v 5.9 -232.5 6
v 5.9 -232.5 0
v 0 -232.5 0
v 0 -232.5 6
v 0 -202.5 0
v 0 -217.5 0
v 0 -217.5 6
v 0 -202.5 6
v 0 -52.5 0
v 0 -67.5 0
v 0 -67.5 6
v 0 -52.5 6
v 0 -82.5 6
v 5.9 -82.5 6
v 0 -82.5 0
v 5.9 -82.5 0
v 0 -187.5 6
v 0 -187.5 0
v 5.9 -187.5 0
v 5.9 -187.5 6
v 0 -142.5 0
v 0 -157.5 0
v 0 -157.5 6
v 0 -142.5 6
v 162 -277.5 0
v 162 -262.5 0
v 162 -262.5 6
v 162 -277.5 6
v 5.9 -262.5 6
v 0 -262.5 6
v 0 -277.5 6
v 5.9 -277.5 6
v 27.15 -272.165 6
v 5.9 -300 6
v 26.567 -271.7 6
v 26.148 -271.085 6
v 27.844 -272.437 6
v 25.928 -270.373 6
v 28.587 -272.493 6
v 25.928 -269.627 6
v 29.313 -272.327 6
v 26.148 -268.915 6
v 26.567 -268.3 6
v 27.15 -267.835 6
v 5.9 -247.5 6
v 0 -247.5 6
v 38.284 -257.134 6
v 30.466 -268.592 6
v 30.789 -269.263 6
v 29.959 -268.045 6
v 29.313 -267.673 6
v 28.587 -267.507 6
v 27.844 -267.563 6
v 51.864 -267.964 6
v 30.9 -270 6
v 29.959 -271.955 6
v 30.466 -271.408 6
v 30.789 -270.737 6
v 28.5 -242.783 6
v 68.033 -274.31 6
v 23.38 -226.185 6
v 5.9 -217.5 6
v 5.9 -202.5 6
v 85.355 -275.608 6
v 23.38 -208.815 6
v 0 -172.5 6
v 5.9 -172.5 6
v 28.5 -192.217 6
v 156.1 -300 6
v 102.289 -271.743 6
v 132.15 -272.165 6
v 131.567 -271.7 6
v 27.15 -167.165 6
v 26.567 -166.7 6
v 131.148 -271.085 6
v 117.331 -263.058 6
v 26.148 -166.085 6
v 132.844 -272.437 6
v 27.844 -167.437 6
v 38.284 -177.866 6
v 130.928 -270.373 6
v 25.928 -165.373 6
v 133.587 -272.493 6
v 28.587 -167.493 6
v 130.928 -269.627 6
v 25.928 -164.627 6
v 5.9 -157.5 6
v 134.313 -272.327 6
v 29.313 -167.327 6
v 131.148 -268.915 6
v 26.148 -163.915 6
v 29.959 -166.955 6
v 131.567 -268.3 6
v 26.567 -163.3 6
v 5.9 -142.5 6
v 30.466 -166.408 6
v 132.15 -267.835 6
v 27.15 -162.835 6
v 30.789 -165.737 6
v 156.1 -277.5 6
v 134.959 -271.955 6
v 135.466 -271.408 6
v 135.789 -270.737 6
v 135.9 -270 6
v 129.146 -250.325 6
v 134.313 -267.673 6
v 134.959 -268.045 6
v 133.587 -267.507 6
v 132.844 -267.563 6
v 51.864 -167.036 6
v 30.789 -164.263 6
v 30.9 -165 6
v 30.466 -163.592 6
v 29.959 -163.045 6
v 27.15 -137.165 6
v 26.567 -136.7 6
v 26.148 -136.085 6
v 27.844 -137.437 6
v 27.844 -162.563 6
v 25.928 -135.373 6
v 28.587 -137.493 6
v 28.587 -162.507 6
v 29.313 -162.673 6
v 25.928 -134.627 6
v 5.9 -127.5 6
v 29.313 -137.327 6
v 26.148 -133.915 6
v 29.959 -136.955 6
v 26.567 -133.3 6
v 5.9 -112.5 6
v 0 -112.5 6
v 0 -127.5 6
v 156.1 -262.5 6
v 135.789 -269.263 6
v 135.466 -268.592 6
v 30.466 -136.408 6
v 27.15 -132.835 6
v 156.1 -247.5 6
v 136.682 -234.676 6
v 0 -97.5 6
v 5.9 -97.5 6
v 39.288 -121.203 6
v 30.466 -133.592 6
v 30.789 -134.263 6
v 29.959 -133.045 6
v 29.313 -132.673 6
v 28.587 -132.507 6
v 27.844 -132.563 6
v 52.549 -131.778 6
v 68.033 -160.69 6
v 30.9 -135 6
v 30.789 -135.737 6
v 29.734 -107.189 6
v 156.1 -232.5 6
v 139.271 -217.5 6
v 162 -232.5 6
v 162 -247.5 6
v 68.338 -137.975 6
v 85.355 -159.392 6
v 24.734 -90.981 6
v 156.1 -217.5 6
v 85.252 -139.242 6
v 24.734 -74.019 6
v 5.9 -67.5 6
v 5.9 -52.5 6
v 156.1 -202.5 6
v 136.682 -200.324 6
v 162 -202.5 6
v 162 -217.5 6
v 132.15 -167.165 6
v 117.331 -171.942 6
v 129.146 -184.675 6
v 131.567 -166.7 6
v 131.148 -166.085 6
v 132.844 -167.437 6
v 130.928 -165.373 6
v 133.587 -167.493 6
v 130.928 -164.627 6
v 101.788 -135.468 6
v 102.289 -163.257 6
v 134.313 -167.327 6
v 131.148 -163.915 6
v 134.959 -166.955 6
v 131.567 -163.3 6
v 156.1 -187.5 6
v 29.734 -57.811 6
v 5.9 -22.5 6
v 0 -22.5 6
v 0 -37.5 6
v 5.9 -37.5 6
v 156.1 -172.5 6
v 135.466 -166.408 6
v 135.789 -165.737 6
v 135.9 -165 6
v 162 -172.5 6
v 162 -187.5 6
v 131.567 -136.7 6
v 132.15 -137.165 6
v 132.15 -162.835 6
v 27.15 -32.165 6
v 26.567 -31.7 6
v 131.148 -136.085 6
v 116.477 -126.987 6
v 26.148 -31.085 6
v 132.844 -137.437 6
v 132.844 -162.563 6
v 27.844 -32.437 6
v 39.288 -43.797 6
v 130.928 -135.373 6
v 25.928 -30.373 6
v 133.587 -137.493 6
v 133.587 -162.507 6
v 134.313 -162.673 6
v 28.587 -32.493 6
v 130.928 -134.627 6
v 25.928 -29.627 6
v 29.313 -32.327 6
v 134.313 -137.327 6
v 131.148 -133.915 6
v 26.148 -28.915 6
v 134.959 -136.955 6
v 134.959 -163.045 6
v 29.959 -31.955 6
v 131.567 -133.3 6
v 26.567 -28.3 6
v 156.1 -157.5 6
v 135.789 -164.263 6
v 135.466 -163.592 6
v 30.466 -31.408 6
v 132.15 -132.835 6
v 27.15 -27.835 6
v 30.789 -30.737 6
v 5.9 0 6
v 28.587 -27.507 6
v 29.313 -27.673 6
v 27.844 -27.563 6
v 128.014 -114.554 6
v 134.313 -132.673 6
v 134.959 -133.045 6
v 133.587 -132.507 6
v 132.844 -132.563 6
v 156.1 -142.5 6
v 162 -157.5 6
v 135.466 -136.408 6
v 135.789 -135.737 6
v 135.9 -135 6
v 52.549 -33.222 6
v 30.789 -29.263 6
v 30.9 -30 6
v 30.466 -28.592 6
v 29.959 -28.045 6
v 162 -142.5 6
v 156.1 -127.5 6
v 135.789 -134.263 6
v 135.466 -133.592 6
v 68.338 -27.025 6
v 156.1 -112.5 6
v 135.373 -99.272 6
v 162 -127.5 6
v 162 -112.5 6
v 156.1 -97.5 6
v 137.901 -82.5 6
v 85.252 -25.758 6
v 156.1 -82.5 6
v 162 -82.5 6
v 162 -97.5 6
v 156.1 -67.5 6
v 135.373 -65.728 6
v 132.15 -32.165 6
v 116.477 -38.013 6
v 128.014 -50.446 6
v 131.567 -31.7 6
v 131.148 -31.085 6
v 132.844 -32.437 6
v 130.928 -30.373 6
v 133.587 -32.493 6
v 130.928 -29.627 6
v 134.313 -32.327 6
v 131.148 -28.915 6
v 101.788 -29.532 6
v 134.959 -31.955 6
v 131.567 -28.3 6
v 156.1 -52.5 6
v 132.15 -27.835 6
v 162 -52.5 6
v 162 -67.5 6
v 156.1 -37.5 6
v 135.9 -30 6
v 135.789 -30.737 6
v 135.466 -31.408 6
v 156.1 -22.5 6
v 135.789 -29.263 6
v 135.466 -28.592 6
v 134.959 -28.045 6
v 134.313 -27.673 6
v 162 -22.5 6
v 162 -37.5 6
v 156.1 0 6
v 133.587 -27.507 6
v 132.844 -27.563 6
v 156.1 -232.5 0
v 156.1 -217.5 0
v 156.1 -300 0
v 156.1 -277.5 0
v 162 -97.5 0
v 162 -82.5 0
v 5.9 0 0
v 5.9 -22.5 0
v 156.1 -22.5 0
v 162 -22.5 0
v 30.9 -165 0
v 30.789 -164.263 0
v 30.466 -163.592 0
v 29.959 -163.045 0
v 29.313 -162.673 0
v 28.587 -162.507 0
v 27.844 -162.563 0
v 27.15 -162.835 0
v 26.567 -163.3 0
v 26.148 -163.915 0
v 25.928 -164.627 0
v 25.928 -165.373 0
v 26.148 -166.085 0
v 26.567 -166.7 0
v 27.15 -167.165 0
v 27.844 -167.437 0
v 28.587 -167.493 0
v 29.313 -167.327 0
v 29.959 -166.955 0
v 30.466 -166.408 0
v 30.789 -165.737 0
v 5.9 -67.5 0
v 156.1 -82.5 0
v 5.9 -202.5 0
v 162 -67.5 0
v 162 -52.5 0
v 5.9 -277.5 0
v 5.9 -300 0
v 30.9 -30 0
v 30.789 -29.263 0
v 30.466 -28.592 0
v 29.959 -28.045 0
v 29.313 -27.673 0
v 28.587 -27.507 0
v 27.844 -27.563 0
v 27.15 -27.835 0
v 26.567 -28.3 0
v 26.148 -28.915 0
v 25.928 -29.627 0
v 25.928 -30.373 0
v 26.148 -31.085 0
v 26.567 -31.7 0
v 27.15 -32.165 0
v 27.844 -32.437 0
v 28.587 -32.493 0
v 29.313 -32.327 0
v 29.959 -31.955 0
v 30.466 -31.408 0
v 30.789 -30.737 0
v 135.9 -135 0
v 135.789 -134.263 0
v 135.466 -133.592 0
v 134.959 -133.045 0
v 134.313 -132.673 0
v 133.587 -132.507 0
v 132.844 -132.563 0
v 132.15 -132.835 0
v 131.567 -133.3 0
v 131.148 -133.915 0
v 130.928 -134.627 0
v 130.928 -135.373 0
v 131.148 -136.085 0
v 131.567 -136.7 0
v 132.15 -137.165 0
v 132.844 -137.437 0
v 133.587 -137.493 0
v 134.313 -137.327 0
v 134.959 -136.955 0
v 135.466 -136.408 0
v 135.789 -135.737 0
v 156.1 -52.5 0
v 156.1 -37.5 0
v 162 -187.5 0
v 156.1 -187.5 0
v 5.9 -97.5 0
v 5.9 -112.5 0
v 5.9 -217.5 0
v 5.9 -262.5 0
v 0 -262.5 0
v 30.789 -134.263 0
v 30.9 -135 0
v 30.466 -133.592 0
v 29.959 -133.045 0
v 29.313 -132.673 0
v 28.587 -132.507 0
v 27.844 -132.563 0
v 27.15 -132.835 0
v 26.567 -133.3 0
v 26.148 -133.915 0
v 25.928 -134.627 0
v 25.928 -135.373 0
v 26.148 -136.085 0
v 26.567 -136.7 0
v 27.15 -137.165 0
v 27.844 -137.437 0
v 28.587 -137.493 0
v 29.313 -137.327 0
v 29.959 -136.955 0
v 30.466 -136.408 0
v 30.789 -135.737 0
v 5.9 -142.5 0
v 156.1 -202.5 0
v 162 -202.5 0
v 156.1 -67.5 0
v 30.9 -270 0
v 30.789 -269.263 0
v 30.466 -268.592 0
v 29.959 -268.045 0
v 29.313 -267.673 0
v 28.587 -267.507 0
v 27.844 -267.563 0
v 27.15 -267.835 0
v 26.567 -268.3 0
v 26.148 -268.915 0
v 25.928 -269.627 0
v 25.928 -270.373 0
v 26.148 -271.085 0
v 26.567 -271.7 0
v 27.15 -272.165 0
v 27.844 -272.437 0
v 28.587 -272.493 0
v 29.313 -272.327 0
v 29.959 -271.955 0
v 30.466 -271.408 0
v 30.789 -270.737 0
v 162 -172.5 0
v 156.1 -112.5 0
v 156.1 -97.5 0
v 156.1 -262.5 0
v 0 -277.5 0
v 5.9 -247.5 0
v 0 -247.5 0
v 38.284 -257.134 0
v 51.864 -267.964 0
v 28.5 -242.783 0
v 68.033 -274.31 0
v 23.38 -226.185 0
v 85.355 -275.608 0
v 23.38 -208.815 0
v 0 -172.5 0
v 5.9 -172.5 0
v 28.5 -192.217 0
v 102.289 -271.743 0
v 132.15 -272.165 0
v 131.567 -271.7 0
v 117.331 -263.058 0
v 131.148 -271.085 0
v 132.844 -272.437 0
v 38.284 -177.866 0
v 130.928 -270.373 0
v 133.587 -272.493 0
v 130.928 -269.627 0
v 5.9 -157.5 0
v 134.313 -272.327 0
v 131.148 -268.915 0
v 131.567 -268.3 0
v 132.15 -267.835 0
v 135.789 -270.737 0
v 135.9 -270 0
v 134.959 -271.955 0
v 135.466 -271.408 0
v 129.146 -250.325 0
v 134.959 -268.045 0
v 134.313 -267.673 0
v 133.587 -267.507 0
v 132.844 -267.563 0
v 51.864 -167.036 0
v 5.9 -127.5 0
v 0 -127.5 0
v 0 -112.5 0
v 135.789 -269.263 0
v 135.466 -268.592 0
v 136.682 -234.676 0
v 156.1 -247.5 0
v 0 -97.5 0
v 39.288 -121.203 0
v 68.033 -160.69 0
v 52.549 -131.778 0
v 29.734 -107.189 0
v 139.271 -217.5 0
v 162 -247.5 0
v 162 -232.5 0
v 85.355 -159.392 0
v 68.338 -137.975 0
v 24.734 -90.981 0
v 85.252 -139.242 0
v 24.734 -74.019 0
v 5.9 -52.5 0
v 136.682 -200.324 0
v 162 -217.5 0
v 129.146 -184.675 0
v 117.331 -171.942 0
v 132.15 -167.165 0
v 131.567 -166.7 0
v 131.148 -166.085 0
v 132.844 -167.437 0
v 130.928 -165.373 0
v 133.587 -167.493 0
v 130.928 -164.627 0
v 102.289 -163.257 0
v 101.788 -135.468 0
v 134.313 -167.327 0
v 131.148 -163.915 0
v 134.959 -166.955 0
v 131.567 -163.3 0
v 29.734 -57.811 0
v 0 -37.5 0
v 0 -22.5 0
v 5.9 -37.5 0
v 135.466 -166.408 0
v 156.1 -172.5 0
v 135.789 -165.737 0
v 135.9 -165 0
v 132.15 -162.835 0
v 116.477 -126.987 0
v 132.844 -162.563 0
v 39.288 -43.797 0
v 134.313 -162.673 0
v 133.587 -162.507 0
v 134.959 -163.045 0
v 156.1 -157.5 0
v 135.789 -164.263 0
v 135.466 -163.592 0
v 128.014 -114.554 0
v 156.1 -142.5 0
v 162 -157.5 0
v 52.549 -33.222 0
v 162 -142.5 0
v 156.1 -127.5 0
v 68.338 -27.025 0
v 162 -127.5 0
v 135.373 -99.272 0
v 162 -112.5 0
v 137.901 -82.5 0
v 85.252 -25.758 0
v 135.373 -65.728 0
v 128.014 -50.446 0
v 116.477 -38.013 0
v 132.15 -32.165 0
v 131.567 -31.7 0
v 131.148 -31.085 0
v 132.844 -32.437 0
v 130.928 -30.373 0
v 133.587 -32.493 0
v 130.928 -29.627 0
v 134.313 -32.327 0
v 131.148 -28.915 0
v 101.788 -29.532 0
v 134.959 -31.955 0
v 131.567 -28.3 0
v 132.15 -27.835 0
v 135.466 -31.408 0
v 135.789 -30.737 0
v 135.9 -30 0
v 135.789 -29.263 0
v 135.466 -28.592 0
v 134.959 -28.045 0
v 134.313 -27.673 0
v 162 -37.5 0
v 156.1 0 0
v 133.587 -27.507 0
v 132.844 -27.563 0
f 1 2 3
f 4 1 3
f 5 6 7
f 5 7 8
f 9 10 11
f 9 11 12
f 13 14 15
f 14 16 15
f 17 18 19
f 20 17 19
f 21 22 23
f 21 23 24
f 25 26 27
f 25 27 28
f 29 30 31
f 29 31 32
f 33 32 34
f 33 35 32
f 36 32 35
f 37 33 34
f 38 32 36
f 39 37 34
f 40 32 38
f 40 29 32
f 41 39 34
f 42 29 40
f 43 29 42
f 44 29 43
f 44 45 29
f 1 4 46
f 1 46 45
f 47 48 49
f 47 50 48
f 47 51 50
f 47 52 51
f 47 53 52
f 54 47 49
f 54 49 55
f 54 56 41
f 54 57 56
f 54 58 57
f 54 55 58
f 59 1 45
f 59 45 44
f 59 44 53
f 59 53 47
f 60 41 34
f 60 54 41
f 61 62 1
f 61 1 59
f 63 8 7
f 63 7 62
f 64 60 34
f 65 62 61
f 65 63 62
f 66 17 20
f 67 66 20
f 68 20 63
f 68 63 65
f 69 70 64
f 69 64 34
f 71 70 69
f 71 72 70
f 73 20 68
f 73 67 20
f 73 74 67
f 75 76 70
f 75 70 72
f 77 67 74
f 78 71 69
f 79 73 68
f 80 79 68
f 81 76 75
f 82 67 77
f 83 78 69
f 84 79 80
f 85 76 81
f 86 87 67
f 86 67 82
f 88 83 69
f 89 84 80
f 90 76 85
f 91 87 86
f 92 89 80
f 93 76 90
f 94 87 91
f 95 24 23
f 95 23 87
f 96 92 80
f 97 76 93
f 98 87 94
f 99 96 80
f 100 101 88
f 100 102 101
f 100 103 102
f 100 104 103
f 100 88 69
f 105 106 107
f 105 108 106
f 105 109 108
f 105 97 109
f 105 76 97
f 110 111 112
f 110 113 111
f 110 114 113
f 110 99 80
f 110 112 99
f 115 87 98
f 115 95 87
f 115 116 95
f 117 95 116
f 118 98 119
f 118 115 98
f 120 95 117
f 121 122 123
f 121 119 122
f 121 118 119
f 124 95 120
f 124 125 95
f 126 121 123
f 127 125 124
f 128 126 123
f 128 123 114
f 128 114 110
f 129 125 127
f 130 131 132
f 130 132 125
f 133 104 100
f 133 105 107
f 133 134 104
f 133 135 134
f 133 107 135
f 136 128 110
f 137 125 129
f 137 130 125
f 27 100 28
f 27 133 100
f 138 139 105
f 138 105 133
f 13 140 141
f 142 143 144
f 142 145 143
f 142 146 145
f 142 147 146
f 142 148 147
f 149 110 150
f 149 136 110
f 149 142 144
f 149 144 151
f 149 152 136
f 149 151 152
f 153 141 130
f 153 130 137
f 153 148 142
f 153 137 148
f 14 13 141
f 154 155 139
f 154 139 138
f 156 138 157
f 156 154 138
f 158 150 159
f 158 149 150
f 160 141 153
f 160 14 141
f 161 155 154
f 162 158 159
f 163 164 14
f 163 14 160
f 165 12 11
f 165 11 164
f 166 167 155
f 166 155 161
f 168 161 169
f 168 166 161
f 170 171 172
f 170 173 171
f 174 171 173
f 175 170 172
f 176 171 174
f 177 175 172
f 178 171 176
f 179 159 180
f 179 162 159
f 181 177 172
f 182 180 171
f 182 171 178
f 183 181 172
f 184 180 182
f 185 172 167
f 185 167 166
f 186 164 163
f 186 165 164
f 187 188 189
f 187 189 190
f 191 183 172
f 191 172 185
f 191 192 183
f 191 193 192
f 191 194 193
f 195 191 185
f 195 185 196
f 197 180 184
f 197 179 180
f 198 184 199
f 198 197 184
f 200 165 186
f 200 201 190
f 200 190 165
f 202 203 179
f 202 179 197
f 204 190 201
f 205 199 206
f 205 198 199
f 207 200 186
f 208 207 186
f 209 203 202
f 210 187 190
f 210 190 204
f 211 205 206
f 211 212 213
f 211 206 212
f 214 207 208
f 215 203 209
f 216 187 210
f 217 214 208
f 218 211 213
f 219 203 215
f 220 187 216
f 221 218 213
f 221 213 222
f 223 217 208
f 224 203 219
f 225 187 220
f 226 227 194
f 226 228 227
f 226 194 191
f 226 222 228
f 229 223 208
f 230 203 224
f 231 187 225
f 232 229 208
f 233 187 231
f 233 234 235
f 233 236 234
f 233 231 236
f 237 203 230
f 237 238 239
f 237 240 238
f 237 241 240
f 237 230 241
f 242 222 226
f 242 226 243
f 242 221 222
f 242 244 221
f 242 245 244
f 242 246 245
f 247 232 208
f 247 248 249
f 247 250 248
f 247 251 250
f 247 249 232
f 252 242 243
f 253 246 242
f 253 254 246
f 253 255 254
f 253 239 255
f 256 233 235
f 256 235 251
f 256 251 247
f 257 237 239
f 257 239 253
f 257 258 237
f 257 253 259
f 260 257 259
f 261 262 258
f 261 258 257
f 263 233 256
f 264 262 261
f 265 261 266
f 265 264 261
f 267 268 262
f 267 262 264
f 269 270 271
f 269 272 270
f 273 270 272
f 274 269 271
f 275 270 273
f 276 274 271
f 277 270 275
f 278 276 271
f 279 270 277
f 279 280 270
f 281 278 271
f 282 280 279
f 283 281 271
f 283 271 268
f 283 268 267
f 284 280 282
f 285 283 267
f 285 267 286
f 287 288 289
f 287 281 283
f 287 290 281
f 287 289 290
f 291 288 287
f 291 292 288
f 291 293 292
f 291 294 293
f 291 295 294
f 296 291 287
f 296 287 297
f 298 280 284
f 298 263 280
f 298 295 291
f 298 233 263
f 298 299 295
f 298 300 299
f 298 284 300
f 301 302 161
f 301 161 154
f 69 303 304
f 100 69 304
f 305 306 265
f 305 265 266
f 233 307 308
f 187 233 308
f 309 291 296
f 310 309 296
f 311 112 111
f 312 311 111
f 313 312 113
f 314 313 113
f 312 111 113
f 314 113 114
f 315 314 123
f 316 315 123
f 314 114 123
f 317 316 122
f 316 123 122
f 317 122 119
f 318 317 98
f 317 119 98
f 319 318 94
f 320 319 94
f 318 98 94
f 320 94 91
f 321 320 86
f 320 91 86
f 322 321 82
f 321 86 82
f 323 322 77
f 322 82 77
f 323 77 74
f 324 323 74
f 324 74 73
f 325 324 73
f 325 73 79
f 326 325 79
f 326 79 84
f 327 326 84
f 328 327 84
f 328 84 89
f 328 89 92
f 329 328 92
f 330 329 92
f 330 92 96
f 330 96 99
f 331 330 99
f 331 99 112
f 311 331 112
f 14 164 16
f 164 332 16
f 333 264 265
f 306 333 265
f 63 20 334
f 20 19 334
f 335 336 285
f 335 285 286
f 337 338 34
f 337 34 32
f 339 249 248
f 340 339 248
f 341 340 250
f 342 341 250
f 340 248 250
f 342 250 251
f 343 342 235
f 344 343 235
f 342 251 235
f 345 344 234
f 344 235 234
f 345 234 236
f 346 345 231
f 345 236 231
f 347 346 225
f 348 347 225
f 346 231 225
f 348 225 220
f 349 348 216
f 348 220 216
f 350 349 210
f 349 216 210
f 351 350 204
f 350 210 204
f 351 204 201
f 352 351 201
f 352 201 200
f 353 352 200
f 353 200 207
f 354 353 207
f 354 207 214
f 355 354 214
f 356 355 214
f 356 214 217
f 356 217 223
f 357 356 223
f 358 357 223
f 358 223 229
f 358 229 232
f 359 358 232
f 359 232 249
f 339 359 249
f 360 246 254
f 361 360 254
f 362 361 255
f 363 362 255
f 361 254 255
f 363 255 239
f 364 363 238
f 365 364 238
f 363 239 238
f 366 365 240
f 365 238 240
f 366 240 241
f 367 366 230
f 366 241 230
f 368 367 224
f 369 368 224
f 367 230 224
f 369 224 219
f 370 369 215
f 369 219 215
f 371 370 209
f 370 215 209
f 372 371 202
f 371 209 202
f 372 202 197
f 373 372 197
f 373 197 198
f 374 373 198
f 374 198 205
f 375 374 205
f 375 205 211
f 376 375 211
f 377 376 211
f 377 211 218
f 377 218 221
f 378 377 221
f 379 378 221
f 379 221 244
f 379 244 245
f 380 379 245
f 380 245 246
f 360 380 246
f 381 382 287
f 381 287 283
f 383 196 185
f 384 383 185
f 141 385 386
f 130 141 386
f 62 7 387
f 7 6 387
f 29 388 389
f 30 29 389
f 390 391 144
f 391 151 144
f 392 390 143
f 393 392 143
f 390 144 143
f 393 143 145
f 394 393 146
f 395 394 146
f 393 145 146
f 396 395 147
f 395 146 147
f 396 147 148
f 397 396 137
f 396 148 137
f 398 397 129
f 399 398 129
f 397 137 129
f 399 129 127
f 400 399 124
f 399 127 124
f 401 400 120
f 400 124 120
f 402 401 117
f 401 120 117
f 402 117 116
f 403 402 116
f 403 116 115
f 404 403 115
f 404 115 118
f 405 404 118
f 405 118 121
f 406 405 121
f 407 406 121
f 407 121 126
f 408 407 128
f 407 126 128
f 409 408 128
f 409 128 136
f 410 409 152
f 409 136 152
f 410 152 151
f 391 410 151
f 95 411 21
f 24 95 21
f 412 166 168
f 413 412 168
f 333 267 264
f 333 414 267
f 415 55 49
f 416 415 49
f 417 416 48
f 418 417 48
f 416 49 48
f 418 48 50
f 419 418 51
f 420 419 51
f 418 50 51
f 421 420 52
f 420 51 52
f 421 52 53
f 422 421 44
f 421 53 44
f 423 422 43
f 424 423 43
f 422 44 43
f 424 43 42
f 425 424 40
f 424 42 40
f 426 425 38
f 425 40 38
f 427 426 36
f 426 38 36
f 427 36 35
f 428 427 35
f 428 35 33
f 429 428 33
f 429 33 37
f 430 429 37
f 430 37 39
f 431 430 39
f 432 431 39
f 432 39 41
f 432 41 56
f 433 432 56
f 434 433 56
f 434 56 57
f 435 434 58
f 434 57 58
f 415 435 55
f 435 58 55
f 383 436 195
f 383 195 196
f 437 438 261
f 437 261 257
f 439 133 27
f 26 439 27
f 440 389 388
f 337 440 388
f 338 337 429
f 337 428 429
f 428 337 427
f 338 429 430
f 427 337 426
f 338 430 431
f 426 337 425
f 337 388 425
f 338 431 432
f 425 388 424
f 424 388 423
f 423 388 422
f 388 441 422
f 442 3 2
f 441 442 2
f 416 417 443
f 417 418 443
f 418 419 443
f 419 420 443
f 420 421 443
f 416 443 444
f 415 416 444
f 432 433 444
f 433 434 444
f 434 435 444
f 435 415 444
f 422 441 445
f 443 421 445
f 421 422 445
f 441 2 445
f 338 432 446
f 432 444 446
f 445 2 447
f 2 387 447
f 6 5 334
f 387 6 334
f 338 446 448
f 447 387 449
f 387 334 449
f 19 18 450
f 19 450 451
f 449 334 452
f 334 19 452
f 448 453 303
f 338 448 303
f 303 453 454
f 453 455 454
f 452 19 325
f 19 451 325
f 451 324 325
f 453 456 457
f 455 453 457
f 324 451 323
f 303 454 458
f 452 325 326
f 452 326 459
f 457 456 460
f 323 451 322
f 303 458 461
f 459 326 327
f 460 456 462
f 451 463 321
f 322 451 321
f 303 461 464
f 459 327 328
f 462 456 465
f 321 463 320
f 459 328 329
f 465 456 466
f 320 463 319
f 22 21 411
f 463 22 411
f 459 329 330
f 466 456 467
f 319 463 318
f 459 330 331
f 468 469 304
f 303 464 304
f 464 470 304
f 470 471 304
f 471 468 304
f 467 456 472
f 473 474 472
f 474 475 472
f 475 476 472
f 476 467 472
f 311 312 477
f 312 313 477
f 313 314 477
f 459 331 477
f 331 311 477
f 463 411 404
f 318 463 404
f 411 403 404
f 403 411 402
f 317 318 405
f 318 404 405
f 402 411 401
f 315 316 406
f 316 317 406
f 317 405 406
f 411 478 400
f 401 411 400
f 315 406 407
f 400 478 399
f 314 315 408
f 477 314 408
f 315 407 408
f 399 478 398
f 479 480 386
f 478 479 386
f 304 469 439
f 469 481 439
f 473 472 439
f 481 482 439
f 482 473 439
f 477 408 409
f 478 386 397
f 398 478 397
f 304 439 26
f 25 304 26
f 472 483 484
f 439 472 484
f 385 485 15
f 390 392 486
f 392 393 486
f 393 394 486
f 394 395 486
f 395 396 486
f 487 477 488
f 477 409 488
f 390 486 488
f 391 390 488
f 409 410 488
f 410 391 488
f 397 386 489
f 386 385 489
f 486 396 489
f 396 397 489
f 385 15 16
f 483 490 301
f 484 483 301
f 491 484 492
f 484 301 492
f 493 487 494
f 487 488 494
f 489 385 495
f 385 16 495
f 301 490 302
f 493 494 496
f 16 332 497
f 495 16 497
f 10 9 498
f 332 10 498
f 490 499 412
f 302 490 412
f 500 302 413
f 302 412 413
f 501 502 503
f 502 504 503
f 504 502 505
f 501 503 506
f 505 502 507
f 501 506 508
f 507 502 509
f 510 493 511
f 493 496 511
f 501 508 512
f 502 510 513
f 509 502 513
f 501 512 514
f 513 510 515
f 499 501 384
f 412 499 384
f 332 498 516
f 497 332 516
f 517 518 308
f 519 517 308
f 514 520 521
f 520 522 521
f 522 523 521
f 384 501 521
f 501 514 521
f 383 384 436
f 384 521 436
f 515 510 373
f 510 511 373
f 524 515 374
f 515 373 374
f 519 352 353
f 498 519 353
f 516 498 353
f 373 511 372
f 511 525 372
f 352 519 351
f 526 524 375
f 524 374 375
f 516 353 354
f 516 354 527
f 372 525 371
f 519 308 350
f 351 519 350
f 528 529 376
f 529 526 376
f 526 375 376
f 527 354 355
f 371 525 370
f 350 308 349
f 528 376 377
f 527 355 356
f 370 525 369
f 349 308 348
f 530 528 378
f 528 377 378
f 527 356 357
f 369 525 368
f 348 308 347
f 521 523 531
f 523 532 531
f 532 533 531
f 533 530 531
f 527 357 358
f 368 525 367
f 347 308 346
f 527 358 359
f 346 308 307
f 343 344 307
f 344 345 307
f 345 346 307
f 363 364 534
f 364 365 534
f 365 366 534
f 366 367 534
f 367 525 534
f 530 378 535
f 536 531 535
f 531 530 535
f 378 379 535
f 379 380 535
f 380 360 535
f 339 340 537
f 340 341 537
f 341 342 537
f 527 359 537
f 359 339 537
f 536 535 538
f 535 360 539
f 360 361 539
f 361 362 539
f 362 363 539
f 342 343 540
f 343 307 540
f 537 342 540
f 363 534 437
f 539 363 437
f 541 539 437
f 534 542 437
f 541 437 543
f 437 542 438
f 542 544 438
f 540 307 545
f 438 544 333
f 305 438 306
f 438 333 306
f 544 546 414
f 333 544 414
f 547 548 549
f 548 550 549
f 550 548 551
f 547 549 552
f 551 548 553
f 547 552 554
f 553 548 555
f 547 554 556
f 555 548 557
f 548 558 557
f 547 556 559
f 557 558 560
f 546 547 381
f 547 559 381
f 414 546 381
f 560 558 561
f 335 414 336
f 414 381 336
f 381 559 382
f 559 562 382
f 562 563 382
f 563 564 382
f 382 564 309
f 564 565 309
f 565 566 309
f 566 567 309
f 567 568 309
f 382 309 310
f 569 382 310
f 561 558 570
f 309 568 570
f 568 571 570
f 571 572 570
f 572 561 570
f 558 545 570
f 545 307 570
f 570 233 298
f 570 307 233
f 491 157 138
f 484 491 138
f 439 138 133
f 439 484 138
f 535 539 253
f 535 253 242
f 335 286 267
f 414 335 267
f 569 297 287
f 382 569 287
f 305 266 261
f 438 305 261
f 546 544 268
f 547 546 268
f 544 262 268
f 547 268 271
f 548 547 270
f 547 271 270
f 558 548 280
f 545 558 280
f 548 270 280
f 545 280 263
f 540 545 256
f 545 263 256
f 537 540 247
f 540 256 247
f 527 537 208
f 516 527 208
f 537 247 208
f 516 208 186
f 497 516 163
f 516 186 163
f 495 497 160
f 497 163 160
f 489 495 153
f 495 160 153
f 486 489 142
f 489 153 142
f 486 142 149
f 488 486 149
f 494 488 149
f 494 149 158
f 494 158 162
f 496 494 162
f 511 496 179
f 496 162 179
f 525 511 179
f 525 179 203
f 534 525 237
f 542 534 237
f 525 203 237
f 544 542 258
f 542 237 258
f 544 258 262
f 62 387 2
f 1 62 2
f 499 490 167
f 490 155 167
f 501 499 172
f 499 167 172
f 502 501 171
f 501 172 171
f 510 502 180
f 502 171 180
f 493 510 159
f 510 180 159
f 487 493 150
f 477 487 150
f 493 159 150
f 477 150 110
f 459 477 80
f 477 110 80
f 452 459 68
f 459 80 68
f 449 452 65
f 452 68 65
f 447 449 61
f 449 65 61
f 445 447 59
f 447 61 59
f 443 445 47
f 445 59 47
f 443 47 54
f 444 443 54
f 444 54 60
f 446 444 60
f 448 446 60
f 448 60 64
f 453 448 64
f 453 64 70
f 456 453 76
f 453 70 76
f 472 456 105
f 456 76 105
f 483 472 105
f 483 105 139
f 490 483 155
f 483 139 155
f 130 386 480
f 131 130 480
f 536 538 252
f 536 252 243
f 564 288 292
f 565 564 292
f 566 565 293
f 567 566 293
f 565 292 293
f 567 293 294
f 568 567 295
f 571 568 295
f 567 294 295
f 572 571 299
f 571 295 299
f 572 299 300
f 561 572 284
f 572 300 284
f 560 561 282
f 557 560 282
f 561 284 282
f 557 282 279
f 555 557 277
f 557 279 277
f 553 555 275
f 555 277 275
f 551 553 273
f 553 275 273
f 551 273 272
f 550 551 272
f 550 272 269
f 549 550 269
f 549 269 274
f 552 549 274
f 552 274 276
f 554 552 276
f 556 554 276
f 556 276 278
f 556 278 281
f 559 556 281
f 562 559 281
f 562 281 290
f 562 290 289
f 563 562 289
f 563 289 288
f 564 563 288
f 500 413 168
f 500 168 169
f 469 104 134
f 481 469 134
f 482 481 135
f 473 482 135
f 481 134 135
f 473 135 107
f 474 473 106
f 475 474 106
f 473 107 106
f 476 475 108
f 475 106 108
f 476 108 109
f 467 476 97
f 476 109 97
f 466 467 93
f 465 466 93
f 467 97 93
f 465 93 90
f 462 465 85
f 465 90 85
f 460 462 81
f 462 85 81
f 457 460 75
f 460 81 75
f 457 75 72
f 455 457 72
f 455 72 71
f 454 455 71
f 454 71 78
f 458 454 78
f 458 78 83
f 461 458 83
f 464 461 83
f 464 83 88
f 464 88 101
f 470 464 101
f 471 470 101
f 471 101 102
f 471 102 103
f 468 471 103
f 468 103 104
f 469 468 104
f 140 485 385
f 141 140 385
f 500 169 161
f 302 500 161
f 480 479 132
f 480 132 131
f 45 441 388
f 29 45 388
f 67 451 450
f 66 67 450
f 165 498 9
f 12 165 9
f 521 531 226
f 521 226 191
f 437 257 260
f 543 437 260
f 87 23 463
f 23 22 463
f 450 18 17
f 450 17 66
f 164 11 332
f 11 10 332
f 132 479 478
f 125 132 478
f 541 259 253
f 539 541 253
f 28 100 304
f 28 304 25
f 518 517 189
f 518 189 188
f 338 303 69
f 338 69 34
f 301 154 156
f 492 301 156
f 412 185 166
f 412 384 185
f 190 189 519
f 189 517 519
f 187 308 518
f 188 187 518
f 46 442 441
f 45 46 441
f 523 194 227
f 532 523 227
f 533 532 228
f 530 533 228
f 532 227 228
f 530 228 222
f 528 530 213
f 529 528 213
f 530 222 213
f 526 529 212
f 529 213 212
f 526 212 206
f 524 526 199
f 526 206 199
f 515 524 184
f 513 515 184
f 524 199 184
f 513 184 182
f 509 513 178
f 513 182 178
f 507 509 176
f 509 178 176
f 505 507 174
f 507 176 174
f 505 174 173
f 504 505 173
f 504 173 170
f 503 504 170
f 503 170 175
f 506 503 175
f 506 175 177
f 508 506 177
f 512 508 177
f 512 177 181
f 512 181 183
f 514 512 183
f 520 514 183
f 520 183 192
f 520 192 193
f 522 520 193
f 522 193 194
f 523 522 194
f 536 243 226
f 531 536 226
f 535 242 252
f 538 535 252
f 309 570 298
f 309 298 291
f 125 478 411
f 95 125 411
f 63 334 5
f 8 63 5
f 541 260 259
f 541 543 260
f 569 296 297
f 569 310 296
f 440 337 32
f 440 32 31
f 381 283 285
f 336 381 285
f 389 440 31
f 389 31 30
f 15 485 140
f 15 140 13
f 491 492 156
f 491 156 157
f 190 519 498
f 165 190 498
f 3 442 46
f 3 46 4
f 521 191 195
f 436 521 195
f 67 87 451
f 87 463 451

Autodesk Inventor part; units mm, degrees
ref_plane "YZ Plane" through (0, 0, 0) normal (1, 0, 0) x (0, 1, 0)
ref_plane "XZ Plane" through (0, 0, 0) normal (0, 1, 0) x (-1, 0, 0)
ref_plane "XY Plane" through (0, 0, 0) normal (0, 0, 1) x (1, 0, 0)
sketch "Sketch1" plane through (0, 0, 0) normal (0, 0, 1) x (1, 0, 0)
  line L0 (0, 0) -> (162, 0)
  line L1 (162, 0) -> (162, -300)
  line L2 (162, -300) -> (0, -300)
  line L3 (0, -300) -> (0, 0)
  dimension "d0" = 162
  dimension "d1" = 300
extrude "Extrusion1" add sketch "Sketch1" along normal blind 6
sketch "Sketch2" plane through (0, 0, 0) normal (0, 0, -1) x (-1, 0, 0)
  line L0 (0, 0) -> (-5.9, 0)
  line L1 (-5.9, 0) -> (-5.9, -22.5)
  line L2 (-5.9, -22.5) -> (0, -22.5)
  line L3 (0, -22.5) -> (0, 0)
  line L4 (-162, 0) -> (0, 0) projected
  line L5 (0, 0) -> (0, -300) projected
  line L6 (0, -37.5) -> (-5.9, -37.5)
  line L7 (-5.9, -37.5) -> (-5.9, -52.5)
  line L8 (-5.9, -52.5) -> (0, -52.5)
  line L9 (0, -52.5) -> (0, -37.5)
  line L10 (0, -30) -> (-5.9, -30)
  line L11 (0, -67.5) -> (-5.9, -67.5)
  line L12 (-5.9, -67.5) -> (-5.9, -82.5)
  line L13 (-5.9, -82.5) -> (0, -82.5)
  line L14 (0, -82.5) -> (0, -67.5)
  line L15 (0, -60) -> (-5.9, -60)
  line L16 (0, -97.5) -> (-5.9, -97.5)
  line L17 (-5.9, -97.5) -> (-5.9, -112.5)
  line L18 (-5.9, -112.5) -> (0, -112.5)
  line L19 (0, -112.5) -> (0, -97.5)
  line L20 (0, -90) -> (-5.9, -90)
  line L21 (0, -127.5) -> (-5.9, -127.5)
  line L22 (-5.9, -127.5) -> (-5.9, -142.5)
  line L23 (-5.9, -142.5) -> (0, -142.5)
  line L24 (0, -142.5) -> (0, -127.5)
  line L25 (0, -120) -> (-5.9, -120)
  line L26 (0, -157.5) -> (-5.9, -157.5)
  line L27 (-5.9, -157.5) -> (-5.9, -172.5)
  line L28 (-5.9, -172.5) -> (0, -172.5)
  line L29 (0, -172.5) -> (0, -157.5)
  line L30 (0, -150) -> (-5.9, -150)
  line L31 (0, -187.5) -> (-5.9, -187.5)
  line L32 (-5.9, -187.5) -> (-5.9, -202.5)
  line L33 (-5.9, -202.5) -> (0, -202.5)
  line L34 (0, -202.5) -> (0, -187.5)
  line L35 (0, -180) -> (-5.9, -180)
  line L36 (0, -217.5) -> (-5.9, -217.5)
  line L37 (-5.9, -217.5) -> (-5.9, -232.5)
  line L38 (-5.9, -232.5) -> (0, -232.5)
  line L39 (0, -232.5) -> (0, -217.5)
  line L40 (0, -210) -> (-5.9, -210)
  line L41 (0, -247.5) -> (-5.9, -247.5)
  line L42 (-5.9, -247.5) -> (-5.9, -262.5)
  line L43 (-5.9, -262.5) -> (0, -262.5)
  line L44 (0, -262.5) -> (0, -247.5)
  line L45 (0, -300) -> (-5.9, -300)
  line L46 (-5.9, -300) -> (-5.9, -277.5)
  line L47 (-5.9, -277.5) -> (0, -277.5)
  line L48 (0, -277.5) -> (0, -300)
  line L49 (-162, 0) -> (0, 0) projected
  line L50 (-81, 0) -> (-81, -60)
  line L51 (-162, 0) -> (-156.1, 0)
  line L52 (-156.1, 0) -> (-156.1, -22.5)
  line L53 (-156.1, -22.5) -> (-162, -22.5)
  line L54 (-162, -22.5) -> (-162, 0)
  line L55 (0, 0) -> (-162, 0)
  line L56 (-162, 0) -> (-162, -300)
  line L57 (-162, -37.5) -> (-156.1, -37.5)
  line L58 (-156.1, -37.5) -> (-156.1, -52.5)
  line L59 (-156.1, -52.5) -> (-162, -52.5)
  line L60 (-162, -52.5) -> (-162, -37.5)
  line L61 (-162, -30) -> (-156.1, -30)
  line L62 (-162, -67.5) -> (-156.1, -67.5)
  line L63 (-156.1, -67.5) -> (-156.1, -82.5)
  line L64 (-156.1, -82.5) -> (-162, -82.5)
  line L65 (-162, -82.5) -> (-162, -67.5)
  line L66 (-162, -60) -> (-156.1, -60)
  line L67 (-162, -97.5) -> (-156.1, -97.5)
  line L68 (-156.1, -97.5) -> (-156.1, -112.5)
  line L69 (-156.1, -112.5) -> (-162, -112.5)
  line L70 (-162, -112.5) -> (-162, -97.5)
  line L71 (-162, -90) -> (-156.1, -90)
  line L72 (-162, -127.5) -> (-156.1, -127.5)
  line L73 (-156.1, -127.5) -> (-156.1, -142.5)
  line L74 (-156.1, -142.5) -> (-162, -142.5)
  line L75 (-162, -142.5) -> (-162, -127.5)
  line L76 (-162, -120) -> (-156.1, -120)
  line L77 (-162, -157.5) -> (-156.1, -157.5)
  line L78 (-156.1, -157.5) -> (-156.1, -172.5)
  line L79 (-156.1, -172.5) -> (-162, -172.5)
  line L80 (-162, -172.5) -> (-162, -157.5)
  line L81 (-162, -150) -> (-156.1, -150)
  line L82 (-162, -187.5) -> (-156.1, -187.5)
  line L83 (-156.1, -187.5) -> (-156.1, -202.5)
  line L84 (-156.1, -202.5) -> (-162, -202.5)
  line L85 (-162, -202.5) -> (-162, -187.5)
  line L86 (-162, -180) -> (-156.1, -180)
  line L87 (-162, -217.5) -> (-156.1, -217.5)
  line L88 (-156.1, -217.5) -> (-156.1, -232.5)
  line L89 (-156.1, -232.5) -> (-162, -232.5)
  line L90 (-162, -232.5) -> (-162, -217.5)
  line L91 (-162, -210) -> (-156.1, -210)
  line L92 (-162, -247.5) -> (-156.1, -247.5)
  line L93 (-156.1, -247.5) -> (-156.1, -262.5)
  line L94 (-156.1, -262.5) -> (-162, -262.5)
  line L95 (-162, -262.5) -> (-162, -247.5)
  line L96 (-162, -300) -> (-156.1, -300)
  line L97 (-156.1, -300) -> (-156.1, -277.5)
  line L98 (-156.1, -277.5) -> (-162, -277.5)
  line L99 (-162, -277.5) -> (-162, -300)
  line L100 (0, 0) -> (-162, 0)
  point P0 (-162, -277.5)
  point P1 (0, -277.5)
  point P2 (0, -262.5)
  point P3 (0, -232.5)
  point P4 (0, -202.5)
  point P5 (-162, -82.5)
  point P6 (0, -172.5)
  point P7 (-162, -157.5)
  point P8 (0, -142.5)
  point P9 (-162, -142.5)
  point P10 (0, -112.5)
  point P11 (-162, -97.5)
  point P12 (0, -82.5)
  point P13 (-162, -247.5)
  point P14 (-156.1, 0)
  point P15 (-162, -232.5)
  dimension "d4" = 0
  dimension "d5" = 5.9
  dimension "d6" = 0
  dimension "d7" = 22.5
  dimension "d8" = 5.9
  dimension "d9" = 15
  dimension "d10" = 15
  dimension "d13" = 30
  dimension "d18" = 22.5
  dimension "d19" = 5.9
extrude "Extrusion2" cut sketch "Sketch2" against normal mid plane 24
sketch "Sketch3" plane through (0, 0, 6) normal (0, 0, 1) x (1, 0, 0)
  circle A0 centre (28.4, -30) radius 2.5
  circle A1 centre (133.4, -30) radius 2.5
  circle A2 centre (28.4, -135) radius 2.5
  circle A3 centre (133.4, -135) radius 2.5
  circle A4 centre (28.4, -165) radius 2.5
  circle A5 centre (133.4, -165) radius 2.5
  circle A6 centre (28.4, -270) radius 2.5
  circle A7 centre (133.4, -270) radius 2.5
  line L0 (5.9, 0) -> (5.9, -22.5) projected
  line L1 (156.1, -22.5) -> (156.1, 0) projected
  line L2 (5.9, -300) -> (156.1, -300) projected
  line L3 (156.1, 0) -> (5.9, 0) projected
  circle A8 centre (81, -82.5) radius 56.9012
  circle A9 centre (81, -217.5) radius 58.271
  line L4 (156.1, -202.5) -> (156.1, -187.5) projected
  point P0 (0, 0)
  dimension "d22" = 5
  dimension "d23" = 5
  dimension "d24" = 5
  dimension "d25" = 5
  dimension "d26" = 5
  dimension "d27" = 5
  dimension "d28" = 5
  dimension "d29" = 5
  dimension "d30" = 105
  dimension "d31" = 105
  dimension "d32" = 105
  dimension "d33" = 22.5
  dimension "d34" = 150.2
  dimension "d35" = 105
  dimension "d36" = 105
  dimension "d37" = 105
  dimension "d38" = 30
  dimension "d39" = 22.5
  dimension "d40" = 30
  dimension "d41" = 105
  dimension "d44" = 135
  dimension "d45" = 30
  dimension "d46" = 82.5
  dimension "d47" = 75.1
  dimension "d48" = 75.1
extrude "Extrusion3" cut sketch "Sketch3" along normal mid plane 24
equation "\"d2\" = WoodWidth"
equation "\"d5\" = WoodWidth - LaserWith"
equation "\"d8\" = d5"
equation "\"d18\" = d7"
equation "\"d19\" = d5"
equation "\"d20\" = 4 * WoodWidth"
equation "\"d39\" = d33"
equation "\"d40\" = d38"
equation "\"d42\" = 4 * WoodWidth"
equation "\"WoodWidth\" = 6"
equation "\"LaserWith\" = 0.1"
properties part number "BackFrontPannel"
